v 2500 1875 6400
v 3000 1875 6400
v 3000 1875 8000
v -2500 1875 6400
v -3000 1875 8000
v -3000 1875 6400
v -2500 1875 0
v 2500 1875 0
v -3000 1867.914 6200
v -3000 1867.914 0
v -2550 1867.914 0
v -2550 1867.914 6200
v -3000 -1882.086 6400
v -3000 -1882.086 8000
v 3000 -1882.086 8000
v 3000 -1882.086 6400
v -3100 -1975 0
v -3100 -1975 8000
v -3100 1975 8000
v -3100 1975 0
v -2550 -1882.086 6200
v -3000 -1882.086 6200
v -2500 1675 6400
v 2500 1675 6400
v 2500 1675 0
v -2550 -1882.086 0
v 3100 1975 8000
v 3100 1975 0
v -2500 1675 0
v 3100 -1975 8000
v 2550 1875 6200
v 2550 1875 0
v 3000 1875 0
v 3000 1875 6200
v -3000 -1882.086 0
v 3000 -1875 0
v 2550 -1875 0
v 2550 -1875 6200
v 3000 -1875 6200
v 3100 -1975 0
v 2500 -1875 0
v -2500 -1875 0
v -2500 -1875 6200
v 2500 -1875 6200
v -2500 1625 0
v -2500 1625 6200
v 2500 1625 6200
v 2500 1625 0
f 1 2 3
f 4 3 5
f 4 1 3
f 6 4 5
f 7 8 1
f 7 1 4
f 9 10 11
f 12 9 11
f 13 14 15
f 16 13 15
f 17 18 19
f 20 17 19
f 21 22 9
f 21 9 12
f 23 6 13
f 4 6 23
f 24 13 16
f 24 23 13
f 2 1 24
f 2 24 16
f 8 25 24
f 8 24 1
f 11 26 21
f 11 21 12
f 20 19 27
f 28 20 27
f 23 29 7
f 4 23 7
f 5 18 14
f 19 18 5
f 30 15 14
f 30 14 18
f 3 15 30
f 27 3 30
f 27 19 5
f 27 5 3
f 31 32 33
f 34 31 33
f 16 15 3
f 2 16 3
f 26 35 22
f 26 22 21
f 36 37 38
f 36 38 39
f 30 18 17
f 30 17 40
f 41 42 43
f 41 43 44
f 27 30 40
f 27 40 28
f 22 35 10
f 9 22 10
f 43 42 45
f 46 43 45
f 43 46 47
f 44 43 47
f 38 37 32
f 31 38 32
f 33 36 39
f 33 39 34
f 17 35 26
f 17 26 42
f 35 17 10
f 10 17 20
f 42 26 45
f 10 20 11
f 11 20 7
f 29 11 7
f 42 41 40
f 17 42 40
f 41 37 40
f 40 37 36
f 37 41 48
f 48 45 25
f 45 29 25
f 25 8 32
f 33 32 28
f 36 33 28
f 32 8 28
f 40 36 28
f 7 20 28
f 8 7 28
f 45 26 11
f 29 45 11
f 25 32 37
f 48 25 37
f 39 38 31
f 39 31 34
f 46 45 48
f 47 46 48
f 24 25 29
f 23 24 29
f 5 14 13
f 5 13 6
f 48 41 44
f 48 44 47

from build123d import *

# Parameters (mm, degrees)
SKETCH1_W           = 6200
SKETCH1_H           = 3950
BOSS_EXTRUDE1_DEPTH = 8000
SKETCH2_W           = 5000
SKETCH2_H           = 3500
CUT_EXTRUDE3_DEPTH  = 6200
SKETCH4_W           = 450
SKETCH4_H           = 3750
CUT_EXTRUDE5_DEPTH  = 6200
SKETCH5_W           = 5000
SKETCH5_H           = 200
CUT_EXTRUDE6_DEPTH  = 8000
SKETCH6_W           = 6000
SKETCH6_H           = 3757.085511021
CUT_EXTRUDE8_DEPTH  = 1600


with BuildPart() as part:
    # Sketch1 → Boss-Extrude1 (new body)
    with BuildSketch(Plane.XY):
        Rectangle(SKETCH1_W, SKETCH1_H)
    extrude(amount=BOSS_EXTRUDE1_DEPTH)

    # Sketch2 → Cut-Extrude3 (cut)
    with BuildSketch(Plane.XY):
        with Locations((0, -125)):
            Rectangle(SKETCH2_W, SKETCH2_H)
    extrude(amount=CUT_EXTRUDE3_DEPTH, mode=Mode.SUBTRACT)

    # Sketch4 → Cut-Extrude5 (cut)
    with BuildSketch(Plane.XY):
        with Locations((2775, 0)):
            Rectangle(SKETCH4_W, SKETCH4_H)
        with Locations((-2775, -7.085511021)):
            Rectangle(SKETCH4_W, SKETCH4_H)
    extrude(amount=CUT_EXTRUDE5_DEPTH, mode=Mode.SUBTRACT)

    # Sketch5 → Cut-Extrude6 (cut)
    with BuildSketch(Plane(origin=(0, 0, 0), x_dir=(-1, 0, 0), z_dir=(0, 0, -1))):
        with Locations((0, 1775)):
            Rectangle(SKETCH5_W, SKETCH5_H)
    extrude(amount=-CUT_EXTRUDE6_DEPTH, mode=Mode.SUBTRACT)

    # Sketch6 → Cut-Extrude8 (cut)
    with BuildSketch(Plane.XY.offset(8000)):
        with Locations((0, -3.542755511)):
            Rectangle(SKETCH6_W, SKETCH6_H)
    extrude(amount=-CUT_EXTRUDE8_DEPTH, mode=Mode.SUBTRACT)


solid = part.part
